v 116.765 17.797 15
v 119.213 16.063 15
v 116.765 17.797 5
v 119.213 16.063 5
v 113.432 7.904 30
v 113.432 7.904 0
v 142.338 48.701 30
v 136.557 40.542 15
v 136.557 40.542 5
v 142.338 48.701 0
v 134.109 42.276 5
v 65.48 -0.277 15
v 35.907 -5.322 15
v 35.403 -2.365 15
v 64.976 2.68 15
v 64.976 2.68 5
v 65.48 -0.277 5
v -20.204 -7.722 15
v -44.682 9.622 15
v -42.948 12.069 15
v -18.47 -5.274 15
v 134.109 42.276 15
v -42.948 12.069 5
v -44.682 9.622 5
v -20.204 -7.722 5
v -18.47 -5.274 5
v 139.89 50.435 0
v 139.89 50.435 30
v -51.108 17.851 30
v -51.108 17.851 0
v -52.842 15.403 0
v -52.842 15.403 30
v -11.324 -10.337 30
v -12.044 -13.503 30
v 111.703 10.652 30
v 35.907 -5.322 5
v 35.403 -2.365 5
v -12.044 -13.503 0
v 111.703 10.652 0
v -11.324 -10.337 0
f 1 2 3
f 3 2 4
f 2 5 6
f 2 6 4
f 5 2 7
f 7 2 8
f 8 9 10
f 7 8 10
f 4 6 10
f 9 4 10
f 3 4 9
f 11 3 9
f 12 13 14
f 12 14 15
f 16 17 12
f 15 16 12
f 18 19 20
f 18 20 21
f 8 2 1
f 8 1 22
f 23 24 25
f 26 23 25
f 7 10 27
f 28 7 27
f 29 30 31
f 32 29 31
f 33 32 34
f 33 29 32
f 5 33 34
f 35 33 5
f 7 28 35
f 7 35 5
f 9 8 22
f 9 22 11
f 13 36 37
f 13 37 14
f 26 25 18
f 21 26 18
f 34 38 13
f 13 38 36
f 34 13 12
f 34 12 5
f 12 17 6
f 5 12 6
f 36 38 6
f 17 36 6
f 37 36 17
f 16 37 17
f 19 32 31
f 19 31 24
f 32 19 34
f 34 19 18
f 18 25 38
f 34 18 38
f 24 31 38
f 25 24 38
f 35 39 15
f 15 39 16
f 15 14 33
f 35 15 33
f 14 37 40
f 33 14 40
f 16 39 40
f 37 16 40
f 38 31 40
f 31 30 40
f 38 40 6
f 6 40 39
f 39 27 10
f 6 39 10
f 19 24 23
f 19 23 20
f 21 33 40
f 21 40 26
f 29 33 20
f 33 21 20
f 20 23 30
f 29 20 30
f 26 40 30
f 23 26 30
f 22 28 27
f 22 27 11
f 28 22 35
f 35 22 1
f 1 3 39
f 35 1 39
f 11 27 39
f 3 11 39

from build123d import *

# Parameters (mm, degrees)
BOSS_EXTRUDE1_DEPTH = 30
SKETCH4_W           = 30
SKETCH4_H           = 10
CUT_EXTRUDE1_DEPTH  = 22
SKETCH5_W           = 30
SKETCH5_H           = 10
CUT_EXTRUDE2_DEPTH  = 22
SKETCH7_W           = 10
SKETCH7_H           = 30
CUT_EXTRUDE3_DEPTH  = 22


with BuildPart() as part:
    # Sketch1 → Boss-Extrude1 (new body)
    with BuildSketch(Plane.XY):
        Polygon((-52.841994179, 15.40272055), (-12.04436597, -13.503222307), (113.43201935, 7.903510096), (142.337962207, 48.701138306), (139.890104514, 50.435494878), (111.702555671, 10.651802523), (-11.323945253, -10.336970601), (-51.107637608, 17.850578242), align=None)
    extrude(amount=BOSS_EXTRUDE1_DEPTH)

    # Sketch4 → Cut-Extrude1 (cut)
    with BuildSketch(Plane(origin=(1.897901103, -11.124620313, 0), x_dir=(0.9857573554860628, 0.16817382705142964, 0), z_dir=(0.1681738270514296, -0.9857573554860627, 0))):
        with Locations((49.500950021, 10)):
            Rectangle(SKETCH4_W, SKETCH4_H)
    extrude(amount=-CUT_EXTRUDE1_DEPTH, mode=Mode.SUBTRACT)

    # Sketch5 → Cut-Extrude2 (cut)
    with BuildSketch(Plane(origin=(-10.395192144, -14.671695242, 0), x_dir=(0.8159525641948715, -0.5781188571425553, 0), z_dir=(-0.5781188571425553, -0.8159525641948715, 0))):
        with Locations((-27.021163849, 10)):
            Rectangle(SKETCH5_W, SKETCH5_H)
    extrude(amount=-CUT_EXTRUDE2_DEPTH, mode=Mode.SUBTRACT)

    # Sketch7 → Cut-Extrude3 (cut)
    with BuildSketch(Plane(origin=(71.792385036, -50.866353523, 0), x_dir=(0, 0, -1), z_dir=(0.8159525641948736, -0.5781188571425522, 0))):
        with Locations((-10, 97.026078719)):
            Rectangle(SKETCH7_W, SKETCH7_H)
    extrude(amount=-CUT_EXTRUDE3_DEPTH, mode=Mode.SUBTRACT)


solid = part.part
